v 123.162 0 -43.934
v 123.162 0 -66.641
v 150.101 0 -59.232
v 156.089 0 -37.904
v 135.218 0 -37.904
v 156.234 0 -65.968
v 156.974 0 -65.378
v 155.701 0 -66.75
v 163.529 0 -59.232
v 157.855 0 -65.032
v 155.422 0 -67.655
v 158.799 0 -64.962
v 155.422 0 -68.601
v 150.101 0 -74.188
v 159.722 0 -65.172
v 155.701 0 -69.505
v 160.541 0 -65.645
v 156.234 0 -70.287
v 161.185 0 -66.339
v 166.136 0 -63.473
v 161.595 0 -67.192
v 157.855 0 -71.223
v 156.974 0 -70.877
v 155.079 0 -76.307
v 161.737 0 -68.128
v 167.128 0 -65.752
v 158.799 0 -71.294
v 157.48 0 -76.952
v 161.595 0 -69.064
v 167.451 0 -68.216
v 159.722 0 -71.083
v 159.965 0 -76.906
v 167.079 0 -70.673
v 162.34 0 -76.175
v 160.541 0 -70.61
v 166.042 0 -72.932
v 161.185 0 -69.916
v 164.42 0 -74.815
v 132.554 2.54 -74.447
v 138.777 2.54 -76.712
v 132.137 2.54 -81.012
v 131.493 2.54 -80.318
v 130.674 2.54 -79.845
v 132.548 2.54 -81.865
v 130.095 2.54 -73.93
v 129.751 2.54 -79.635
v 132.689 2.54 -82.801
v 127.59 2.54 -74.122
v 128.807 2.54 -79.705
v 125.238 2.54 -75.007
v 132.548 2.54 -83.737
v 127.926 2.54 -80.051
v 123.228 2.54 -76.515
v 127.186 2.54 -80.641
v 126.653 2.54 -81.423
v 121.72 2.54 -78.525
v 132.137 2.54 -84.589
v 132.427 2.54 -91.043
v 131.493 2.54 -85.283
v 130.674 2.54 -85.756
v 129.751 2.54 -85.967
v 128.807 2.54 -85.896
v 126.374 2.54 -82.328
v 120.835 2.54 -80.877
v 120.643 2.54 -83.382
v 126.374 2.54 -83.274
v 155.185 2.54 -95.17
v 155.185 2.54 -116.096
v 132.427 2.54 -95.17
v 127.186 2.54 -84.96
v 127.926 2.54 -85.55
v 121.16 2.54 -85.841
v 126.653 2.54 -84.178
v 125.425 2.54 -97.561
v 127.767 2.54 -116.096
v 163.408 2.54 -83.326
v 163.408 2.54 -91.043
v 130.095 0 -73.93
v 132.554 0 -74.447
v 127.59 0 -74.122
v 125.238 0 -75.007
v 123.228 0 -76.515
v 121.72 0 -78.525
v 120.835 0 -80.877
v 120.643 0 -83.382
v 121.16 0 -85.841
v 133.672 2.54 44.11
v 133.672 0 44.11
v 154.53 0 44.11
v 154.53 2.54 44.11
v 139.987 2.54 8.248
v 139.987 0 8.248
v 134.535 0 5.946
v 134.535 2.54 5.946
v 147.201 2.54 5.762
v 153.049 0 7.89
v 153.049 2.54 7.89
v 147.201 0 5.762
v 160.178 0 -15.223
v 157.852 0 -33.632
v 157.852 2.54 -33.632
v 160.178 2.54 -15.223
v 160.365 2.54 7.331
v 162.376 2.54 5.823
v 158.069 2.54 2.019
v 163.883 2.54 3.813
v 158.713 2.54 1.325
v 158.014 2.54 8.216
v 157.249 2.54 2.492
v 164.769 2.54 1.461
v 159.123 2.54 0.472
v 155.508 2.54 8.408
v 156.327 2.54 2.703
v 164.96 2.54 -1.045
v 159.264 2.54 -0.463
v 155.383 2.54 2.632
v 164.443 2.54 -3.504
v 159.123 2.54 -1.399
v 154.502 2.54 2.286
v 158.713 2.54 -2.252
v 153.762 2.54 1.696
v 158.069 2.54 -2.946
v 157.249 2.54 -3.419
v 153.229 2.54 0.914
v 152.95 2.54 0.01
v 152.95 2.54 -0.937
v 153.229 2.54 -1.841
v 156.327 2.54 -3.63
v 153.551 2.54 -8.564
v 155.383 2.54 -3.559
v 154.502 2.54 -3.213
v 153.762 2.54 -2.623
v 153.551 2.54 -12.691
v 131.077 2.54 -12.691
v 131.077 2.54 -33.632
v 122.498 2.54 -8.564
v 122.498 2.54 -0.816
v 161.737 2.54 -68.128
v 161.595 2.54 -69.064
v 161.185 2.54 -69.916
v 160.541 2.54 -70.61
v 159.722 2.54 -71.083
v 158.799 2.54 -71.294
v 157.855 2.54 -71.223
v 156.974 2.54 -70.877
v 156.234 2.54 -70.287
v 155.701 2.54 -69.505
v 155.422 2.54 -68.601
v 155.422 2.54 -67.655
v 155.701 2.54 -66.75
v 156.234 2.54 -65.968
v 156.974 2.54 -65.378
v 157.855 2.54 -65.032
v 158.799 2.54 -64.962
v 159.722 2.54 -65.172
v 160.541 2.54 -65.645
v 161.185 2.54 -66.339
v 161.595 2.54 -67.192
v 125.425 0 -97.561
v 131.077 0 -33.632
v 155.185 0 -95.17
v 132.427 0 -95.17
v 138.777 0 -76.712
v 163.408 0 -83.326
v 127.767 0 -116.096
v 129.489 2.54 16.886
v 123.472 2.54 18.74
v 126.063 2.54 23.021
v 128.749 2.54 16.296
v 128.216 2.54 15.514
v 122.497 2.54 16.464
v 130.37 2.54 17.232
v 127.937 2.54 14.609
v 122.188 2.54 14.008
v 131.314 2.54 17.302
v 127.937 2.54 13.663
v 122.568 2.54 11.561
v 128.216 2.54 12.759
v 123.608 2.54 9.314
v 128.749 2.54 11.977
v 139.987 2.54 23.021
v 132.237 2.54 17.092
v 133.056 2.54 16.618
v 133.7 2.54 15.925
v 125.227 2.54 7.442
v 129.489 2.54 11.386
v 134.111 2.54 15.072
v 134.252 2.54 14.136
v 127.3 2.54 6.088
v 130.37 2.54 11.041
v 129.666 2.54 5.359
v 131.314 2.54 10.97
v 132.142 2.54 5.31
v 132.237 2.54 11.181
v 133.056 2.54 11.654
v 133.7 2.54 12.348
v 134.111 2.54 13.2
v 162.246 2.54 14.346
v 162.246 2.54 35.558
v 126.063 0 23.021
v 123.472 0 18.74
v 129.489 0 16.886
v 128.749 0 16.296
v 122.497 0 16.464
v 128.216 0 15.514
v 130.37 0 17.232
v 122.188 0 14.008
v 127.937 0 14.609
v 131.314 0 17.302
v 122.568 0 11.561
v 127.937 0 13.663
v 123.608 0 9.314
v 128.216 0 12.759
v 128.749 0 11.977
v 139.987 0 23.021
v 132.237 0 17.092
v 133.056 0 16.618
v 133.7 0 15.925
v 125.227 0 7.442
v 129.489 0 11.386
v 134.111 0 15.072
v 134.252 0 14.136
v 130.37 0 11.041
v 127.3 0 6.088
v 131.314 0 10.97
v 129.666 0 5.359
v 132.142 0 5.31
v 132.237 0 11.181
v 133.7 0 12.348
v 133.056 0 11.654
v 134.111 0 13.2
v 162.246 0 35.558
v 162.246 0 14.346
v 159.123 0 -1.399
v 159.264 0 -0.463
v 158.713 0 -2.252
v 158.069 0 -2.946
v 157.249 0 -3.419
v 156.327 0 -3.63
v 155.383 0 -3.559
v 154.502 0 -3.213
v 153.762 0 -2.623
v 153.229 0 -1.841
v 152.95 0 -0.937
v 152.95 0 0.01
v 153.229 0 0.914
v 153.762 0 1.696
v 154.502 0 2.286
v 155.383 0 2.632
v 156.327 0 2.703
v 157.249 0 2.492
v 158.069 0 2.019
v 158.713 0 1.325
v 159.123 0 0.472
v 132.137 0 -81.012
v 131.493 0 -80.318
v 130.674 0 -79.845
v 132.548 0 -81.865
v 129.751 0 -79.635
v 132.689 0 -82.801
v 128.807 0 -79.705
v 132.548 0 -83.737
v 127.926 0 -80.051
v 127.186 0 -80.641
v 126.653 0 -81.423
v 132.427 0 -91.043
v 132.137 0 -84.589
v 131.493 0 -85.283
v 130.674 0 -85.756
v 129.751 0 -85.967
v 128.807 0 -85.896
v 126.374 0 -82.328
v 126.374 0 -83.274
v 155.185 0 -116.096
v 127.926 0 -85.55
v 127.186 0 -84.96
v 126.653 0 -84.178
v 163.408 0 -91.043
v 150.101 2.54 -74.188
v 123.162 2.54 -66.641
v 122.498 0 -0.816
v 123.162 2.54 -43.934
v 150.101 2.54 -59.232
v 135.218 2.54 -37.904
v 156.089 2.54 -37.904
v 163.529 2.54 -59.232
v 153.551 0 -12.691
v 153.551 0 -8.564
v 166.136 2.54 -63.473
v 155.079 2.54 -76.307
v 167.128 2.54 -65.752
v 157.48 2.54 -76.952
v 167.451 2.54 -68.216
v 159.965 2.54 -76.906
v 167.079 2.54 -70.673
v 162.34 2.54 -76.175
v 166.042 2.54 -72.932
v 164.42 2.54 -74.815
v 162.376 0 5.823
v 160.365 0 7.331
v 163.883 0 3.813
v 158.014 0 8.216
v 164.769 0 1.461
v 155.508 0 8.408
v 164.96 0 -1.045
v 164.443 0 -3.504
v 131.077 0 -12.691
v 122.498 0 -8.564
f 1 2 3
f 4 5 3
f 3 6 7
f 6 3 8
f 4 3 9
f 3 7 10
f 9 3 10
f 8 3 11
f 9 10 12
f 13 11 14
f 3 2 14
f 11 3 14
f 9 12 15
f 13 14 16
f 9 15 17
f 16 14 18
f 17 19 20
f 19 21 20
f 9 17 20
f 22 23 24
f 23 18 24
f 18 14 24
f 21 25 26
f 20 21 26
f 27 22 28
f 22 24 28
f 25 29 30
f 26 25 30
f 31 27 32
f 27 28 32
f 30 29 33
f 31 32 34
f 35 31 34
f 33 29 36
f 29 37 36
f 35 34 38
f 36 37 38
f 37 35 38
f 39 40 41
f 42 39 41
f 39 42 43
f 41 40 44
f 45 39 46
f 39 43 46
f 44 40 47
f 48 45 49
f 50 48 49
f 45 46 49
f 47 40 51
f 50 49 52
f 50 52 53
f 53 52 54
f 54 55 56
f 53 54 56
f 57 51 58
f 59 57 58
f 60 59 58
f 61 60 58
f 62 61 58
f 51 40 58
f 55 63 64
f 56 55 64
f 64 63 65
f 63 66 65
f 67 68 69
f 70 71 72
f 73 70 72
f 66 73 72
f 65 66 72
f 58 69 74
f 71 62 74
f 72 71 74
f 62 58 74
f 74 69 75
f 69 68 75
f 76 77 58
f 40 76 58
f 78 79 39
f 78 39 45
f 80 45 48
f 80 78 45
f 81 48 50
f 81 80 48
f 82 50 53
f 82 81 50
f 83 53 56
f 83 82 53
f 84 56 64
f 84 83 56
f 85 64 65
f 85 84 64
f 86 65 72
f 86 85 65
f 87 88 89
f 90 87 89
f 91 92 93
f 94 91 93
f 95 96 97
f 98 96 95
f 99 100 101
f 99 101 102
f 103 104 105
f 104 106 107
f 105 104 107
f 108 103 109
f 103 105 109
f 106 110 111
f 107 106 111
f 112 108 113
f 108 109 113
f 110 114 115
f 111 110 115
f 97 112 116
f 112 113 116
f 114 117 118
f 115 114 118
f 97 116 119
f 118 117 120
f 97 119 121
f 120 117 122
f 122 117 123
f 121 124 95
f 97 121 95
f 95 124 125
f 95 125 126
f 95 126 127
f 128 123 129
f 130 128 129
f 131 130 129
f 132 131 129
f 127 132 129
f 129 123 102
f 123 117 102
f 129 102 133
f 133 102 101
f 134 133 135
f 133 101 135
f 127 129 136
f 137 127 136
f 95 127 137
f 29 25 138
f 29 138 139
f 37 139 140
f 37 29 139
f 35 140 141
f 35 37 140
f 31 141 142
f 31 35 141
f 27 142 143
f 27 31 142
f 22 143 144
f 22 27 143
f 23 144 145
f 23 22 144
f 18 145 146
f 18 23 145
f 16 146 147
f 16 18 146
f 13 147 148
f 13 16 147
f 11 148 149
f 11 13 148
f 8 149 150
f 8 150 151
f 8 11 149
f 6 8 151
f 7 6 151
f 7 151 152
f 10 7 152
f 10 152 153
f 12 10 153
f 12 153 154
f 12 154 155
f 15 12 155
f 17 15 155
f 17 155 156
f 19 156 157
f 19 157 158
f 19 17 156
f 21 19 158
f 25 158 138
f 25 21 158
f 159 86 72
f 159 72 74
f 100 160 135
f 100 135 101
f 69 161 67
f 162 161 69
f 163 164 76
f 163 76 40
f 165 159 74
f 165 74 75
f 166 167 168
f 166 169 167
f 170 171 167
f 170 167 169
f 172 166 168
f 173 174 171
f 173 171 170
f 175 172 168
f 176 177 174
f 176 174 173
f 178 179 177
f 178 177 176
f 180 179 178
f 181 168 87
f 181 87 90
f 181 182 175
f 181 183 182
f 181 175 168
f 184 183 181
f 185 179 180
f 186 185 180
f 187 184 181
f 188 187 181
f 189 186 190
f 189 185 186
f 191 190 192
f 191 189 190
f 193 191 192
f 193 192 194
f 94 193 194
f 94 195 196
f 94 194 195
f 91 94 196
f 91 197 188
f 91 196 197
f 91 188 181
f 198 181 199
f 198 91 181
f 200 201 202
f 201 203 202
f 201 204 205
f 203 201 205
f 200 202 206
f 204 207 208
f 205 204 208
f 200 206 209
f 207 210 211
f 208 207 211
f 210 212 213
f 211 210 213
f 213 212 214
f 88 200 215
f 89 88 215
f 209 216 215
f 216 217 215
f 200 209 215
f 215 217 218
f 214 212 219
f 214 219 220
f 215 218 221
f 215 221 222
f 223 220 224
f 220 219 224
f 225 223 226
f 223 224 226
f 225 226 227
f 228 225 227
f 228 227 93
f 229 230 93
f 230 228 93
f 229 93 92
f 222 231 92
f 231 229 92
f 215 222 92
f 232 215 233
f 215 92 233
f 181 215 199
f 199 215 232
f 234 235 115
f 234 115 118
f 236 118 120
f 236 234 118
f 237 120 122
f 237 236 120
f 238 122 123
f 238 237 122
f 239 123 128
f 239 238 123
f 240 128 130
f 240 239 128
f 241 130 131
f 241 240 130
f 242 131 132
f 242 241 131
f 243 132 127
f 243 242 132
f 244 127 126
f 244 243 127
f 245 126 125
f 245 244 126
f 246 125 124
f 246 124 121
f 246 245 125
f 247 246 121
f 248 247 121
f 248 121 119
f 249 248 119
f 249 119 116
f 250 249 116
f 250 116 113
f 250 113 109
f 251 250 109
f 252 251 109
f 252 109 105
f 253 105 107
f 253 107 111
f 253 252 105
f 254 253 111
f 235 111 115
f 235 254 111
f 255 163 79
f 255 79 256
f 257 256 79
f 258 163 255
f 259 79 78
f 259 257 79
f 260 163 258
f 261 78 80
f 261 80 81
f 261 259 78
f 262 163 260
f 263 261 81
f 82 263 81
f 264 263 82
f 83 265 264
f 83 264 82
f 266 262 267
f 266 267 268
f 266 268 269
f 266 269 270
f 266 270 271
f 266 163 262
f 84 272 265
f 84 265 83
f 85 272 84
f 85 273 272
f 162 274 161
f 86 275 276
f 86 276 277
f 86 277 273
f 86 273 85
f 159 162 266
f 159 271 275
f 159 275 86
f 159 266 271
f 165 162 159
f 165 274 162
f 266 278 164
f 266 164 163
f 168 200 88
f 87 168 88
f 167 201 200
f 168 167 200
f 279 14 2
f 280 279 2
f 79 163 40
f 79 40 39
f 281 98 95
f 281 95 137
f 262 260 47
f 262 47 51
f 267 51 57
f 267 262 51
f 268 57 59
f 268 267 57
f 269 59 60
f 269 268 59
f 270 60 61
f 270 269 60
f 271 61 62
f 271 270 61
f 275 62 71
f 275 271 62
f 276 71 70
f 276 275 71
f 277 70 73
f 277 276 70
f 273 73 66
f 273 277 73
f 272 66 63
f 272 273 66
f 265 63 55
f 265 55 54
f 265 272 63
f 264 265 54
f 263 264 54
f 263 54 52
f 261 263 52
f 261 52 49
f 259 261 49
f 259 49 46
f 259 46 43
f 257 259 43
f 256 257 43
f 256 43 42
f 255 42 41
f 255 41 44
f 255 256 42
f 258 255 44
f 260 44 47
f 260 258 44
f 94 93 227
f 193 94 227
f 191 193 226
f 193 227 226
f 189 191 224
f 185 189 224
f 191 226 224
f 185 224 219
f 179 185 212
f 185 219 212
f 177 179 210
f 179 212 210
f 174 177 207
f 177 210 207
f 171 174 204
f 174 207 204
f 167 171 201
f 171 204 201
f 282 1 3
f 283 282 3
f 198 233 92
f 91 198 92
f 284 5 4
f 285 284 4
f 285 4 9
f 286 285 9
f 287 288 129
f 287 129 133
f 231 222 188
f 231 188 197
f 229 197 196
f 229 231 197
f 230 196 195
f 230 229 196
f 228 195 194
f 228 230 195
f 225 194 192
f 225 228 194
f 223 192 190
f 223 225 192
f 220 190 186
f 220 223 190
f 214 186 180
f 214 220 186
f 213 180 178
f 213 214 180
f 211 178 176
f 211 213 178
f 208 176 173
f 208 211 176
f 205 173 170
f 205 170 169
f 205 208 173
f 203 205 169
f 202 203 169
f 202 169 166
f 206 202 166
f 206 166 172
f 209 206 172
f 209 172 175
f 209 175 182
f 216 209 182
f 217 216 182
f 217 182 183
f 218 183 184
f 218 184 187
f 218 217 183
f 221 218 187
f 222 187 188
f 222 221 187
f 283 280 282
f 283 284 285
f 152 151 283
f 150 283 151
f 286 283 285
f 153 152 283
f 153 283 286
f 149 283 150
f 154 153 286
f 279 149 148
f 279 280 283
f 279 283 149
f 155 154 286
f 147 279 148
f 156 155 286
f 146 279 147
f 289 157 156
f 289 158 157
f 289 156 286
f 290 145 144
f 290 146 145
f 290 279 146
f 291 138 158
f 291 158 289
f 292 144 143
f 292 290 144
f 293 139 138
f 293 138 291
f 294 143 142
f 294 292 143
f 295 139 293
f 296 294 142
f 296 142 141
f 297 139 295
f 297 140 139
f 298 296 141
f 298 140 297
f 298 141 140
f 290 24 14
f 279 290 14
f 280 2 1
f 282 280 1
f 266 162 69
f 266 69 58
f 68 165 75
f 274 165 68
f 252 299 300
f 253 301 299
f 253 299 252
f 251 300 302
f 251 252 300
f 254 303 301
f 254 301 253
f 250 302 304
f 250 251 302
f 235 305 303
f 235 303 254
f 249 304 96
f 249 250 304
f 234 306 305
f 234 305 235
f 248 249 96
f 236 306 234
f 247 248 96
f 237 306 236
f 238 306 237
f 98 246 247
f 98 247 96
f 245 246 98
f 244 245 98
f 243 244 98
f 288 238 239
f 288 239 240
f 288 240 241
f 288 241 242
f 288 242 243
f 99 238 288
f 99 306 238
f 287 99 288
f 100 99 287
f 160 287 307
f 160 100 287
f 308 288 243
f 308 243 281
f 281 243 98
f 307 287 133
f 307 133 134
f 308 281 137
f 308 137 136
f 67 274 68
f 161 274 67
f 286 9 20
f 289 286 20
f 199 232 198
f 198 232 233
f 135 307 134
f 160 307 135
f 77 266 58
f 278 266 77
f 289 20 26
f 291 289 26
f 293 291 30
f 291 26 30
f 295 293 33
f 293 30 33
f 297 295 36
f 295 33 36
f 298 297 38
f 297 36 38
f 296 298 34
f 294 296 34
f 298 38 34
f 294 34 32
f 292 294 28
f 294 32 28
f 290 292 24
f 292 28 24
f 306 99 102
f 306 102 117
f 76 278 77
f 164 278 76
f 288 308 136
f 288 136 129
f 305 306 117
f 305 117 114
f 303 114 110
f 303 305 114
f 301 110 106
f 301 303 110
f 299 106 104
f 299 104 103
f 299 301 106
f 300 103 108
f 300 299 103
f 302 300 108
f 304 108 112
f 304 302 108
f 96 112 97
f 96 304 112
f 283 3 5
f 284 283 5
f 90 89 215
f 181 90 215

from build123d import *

# Parameters (mm, degrees)
SKETCH1_R             = 3.175
BOSS_EXTRUDE1_DEPTH   = 2.54
BOSS_EXTRUDE1_2_DEPTH = 2.54
BOSS_EXTRUDE1_3_DEPTH = 2.54
BOSS_EXTRUDE1_4_DEPTH = 2.54


with BuildPart() as part:
    # Sketch1 → Boss-Extrude1 (new body)
    with BuildSketch(Plane(origin=(0, 0, 0), x_dir=(1, 0, 0), z_dir=(0, 1, 0))):
        with BuildLine():
            Line((121.160023429, 85.841348265), (125.425493445, 97.560630816))
            Line((125.425493445, 97.560630816), (127.767090588, 116.096280816))
            Line((127.767090588, 116.096280816), (155.185130831, 116.096280816))
            Line((155.185130831, 116.096280816), (155.185130831, 95.170280682))
            Line((155.185130831, 95.170280682), (132.426730831, 95.170280682))
            Line((132.426730831, 95.170280682), (132.426730831, 91.042780682))
            Line((132.426730831, 91.042780682), (138.776730831, 91.042780682))
            Line((138.776730831, 91.042780682), (163.408380831, 91.042780682))
            Line((163.408380831, 91.042780682), (163.408380831, 83.325571221))
            Line((163.408380831, 83.325571221), (138.777449902, 76.71190856))
            Line((138.777449902, 76.71190856), (132.554449902, 74.446921792))
            ThreePointArc((132.554449902, 74.446921792), (123.227711543, 76.514609906), (121.160023429, 85.841348265))
        make_face()
        with Locations((129.513890828, 82.800789191)):
            Circle(SKETCH1_R, mode=Mode.SUBTRACT)
    extrude(amount=BOSS_EXTRUDE1_DEPTH)


with BuildPart() as body_2:
    # Sketch1 → Boss-Extrude1 2 (new body)
    with BuildSketch(Plane(origin=(0, 0, 0), x_dir=(1, 0, 0), z_dir=(0, 1, 0))):
        with BuildLine():
            Line((123.471705783, -18.7400603), (126.06306228, -23.020584327))
            Line((126.06306228, -23.020584327), (133.672193007, -44.109551442))
            Line((133.672193007, -44.109551442), (154.5296138, -44.109551442))
            Line((154.5296138, -44.109551442), (139.986741583, -23.020584327))
            Line((139.986741583, -23.020584327), (162.246407354, -35.558143344))
            Line((162.246407354, -35.558143344), (162.246407354, -14.346055224))
            Line((162.246407354, -14.346055224), (139.986741583, -8.248147359))
            Line((139.986741583, -8.248147359), (134.534580264, -5.946185543))
            ThreePointArc((134.534580264, -5.946185543), (124.352083456, -8.321347722), (123.471705783, -18.7400603))
        make_face()
        with Locations((131.07669771, -14.136127438)):
            Circle(SKETCH1_R, mode=Mode.SUBTRACT)
    extrude(amount=BOSS_EXTRUDE1_2_DEPTH)


with BuildPart() as body_3:
    # Sketch1 → Boss-Extrude1 3 (new body)
    with BuildSketch(Plane(origin=(0, 0, 0), x_dir=(1, 0, 0), z_dir=(0, 1, 0))):
        with BuildLine():
            Line((155.0793846, 76.307406469), (150.101485678, 74.188258913))
            Line((150.101485678, 74.188258913), (123.162108904, 66.641301888))
            Line((123.162108904, 66.641301888), (123.162108904, 43.934410807))
            Line((123.162108904, 43.934410807), (150.101485678, 59.231888247))
            Line((150.101485678, 59.231888247), (135.217678068, 37.904383964))
            Line((135.217678068, 37.904383964), (156.089383515, 37.904383964))
            Line((156.089383515, 37.904383964), (163.529451504, 59.231888247))
            Line((163.529451504, 59.231888247), (166.135842398, 63.4734909))
            ThreePointArc((166.135842398, 63.4734909), (165.296811041, 73.930206812), (155.0793846, 76.307406469))
        make_face()
        with Locations((158.561551945, 68.127760353)):
            Circle(SKETCH1_R, mode=Mode.SUBTRACT)
    extrude(amount=BOSS_EXTRUDE1_3_DEPTH)


with BuildPart() as body_4:
    # Sketch1 → Boss-Extrude1 4 (new body)
    with BuildSketch(Plane(origin=(0, 0, 0), x_dir=(1, 0, 0), z_dir=(0, 1, 0))):
        with BuildLine():
            Line((153.04882444, -7.890445491), (147.201117261, -5.762054139))
            Line((147.201117261, -5.762054139), (122.497855638, 0.815592547))
            Line((122.497855638, 0.815592547), (122.497855638, 8.563545861))
            Line((122.497855638, 8.563545861), (147.201117261, 8.563545861))
            Line((147.201117261, 8.563545861), (153.551117261, 8.563545861))
            Line((153.551117261, 8.563545861), (153.551117261, 12.691045861))
            Line((153.551117261, 12.691045861), (131.07669771, 12.691045861))
            Line((131.07669771, 12.691045861), (131.07669771, 33.631531264))
            Line((131.07669771, 33.631531264), (157.852275877, 33.631531264))
            Line((157.852275877, 33.631531264), (160.177780898, 15.223263533))
            Line((160.177780898, 15.223263533), (164.443250913, 3.503980982))
            ThreePointArc((164.443250913, 3.503980982), (162.375562799, -5.822757377), (153.04882444, -7.890445491))
        make_face()
        with Locations((156.089383515, 0.463421908)):
            Circle(SKETCH1_R, mode=Mode.SUBTRACT)
    extrude(amount=BOSS_EXTRUDE1_4_DEPTH)


solid = Compound([part.part, body_2.part, body_3.part, body_4.part])
